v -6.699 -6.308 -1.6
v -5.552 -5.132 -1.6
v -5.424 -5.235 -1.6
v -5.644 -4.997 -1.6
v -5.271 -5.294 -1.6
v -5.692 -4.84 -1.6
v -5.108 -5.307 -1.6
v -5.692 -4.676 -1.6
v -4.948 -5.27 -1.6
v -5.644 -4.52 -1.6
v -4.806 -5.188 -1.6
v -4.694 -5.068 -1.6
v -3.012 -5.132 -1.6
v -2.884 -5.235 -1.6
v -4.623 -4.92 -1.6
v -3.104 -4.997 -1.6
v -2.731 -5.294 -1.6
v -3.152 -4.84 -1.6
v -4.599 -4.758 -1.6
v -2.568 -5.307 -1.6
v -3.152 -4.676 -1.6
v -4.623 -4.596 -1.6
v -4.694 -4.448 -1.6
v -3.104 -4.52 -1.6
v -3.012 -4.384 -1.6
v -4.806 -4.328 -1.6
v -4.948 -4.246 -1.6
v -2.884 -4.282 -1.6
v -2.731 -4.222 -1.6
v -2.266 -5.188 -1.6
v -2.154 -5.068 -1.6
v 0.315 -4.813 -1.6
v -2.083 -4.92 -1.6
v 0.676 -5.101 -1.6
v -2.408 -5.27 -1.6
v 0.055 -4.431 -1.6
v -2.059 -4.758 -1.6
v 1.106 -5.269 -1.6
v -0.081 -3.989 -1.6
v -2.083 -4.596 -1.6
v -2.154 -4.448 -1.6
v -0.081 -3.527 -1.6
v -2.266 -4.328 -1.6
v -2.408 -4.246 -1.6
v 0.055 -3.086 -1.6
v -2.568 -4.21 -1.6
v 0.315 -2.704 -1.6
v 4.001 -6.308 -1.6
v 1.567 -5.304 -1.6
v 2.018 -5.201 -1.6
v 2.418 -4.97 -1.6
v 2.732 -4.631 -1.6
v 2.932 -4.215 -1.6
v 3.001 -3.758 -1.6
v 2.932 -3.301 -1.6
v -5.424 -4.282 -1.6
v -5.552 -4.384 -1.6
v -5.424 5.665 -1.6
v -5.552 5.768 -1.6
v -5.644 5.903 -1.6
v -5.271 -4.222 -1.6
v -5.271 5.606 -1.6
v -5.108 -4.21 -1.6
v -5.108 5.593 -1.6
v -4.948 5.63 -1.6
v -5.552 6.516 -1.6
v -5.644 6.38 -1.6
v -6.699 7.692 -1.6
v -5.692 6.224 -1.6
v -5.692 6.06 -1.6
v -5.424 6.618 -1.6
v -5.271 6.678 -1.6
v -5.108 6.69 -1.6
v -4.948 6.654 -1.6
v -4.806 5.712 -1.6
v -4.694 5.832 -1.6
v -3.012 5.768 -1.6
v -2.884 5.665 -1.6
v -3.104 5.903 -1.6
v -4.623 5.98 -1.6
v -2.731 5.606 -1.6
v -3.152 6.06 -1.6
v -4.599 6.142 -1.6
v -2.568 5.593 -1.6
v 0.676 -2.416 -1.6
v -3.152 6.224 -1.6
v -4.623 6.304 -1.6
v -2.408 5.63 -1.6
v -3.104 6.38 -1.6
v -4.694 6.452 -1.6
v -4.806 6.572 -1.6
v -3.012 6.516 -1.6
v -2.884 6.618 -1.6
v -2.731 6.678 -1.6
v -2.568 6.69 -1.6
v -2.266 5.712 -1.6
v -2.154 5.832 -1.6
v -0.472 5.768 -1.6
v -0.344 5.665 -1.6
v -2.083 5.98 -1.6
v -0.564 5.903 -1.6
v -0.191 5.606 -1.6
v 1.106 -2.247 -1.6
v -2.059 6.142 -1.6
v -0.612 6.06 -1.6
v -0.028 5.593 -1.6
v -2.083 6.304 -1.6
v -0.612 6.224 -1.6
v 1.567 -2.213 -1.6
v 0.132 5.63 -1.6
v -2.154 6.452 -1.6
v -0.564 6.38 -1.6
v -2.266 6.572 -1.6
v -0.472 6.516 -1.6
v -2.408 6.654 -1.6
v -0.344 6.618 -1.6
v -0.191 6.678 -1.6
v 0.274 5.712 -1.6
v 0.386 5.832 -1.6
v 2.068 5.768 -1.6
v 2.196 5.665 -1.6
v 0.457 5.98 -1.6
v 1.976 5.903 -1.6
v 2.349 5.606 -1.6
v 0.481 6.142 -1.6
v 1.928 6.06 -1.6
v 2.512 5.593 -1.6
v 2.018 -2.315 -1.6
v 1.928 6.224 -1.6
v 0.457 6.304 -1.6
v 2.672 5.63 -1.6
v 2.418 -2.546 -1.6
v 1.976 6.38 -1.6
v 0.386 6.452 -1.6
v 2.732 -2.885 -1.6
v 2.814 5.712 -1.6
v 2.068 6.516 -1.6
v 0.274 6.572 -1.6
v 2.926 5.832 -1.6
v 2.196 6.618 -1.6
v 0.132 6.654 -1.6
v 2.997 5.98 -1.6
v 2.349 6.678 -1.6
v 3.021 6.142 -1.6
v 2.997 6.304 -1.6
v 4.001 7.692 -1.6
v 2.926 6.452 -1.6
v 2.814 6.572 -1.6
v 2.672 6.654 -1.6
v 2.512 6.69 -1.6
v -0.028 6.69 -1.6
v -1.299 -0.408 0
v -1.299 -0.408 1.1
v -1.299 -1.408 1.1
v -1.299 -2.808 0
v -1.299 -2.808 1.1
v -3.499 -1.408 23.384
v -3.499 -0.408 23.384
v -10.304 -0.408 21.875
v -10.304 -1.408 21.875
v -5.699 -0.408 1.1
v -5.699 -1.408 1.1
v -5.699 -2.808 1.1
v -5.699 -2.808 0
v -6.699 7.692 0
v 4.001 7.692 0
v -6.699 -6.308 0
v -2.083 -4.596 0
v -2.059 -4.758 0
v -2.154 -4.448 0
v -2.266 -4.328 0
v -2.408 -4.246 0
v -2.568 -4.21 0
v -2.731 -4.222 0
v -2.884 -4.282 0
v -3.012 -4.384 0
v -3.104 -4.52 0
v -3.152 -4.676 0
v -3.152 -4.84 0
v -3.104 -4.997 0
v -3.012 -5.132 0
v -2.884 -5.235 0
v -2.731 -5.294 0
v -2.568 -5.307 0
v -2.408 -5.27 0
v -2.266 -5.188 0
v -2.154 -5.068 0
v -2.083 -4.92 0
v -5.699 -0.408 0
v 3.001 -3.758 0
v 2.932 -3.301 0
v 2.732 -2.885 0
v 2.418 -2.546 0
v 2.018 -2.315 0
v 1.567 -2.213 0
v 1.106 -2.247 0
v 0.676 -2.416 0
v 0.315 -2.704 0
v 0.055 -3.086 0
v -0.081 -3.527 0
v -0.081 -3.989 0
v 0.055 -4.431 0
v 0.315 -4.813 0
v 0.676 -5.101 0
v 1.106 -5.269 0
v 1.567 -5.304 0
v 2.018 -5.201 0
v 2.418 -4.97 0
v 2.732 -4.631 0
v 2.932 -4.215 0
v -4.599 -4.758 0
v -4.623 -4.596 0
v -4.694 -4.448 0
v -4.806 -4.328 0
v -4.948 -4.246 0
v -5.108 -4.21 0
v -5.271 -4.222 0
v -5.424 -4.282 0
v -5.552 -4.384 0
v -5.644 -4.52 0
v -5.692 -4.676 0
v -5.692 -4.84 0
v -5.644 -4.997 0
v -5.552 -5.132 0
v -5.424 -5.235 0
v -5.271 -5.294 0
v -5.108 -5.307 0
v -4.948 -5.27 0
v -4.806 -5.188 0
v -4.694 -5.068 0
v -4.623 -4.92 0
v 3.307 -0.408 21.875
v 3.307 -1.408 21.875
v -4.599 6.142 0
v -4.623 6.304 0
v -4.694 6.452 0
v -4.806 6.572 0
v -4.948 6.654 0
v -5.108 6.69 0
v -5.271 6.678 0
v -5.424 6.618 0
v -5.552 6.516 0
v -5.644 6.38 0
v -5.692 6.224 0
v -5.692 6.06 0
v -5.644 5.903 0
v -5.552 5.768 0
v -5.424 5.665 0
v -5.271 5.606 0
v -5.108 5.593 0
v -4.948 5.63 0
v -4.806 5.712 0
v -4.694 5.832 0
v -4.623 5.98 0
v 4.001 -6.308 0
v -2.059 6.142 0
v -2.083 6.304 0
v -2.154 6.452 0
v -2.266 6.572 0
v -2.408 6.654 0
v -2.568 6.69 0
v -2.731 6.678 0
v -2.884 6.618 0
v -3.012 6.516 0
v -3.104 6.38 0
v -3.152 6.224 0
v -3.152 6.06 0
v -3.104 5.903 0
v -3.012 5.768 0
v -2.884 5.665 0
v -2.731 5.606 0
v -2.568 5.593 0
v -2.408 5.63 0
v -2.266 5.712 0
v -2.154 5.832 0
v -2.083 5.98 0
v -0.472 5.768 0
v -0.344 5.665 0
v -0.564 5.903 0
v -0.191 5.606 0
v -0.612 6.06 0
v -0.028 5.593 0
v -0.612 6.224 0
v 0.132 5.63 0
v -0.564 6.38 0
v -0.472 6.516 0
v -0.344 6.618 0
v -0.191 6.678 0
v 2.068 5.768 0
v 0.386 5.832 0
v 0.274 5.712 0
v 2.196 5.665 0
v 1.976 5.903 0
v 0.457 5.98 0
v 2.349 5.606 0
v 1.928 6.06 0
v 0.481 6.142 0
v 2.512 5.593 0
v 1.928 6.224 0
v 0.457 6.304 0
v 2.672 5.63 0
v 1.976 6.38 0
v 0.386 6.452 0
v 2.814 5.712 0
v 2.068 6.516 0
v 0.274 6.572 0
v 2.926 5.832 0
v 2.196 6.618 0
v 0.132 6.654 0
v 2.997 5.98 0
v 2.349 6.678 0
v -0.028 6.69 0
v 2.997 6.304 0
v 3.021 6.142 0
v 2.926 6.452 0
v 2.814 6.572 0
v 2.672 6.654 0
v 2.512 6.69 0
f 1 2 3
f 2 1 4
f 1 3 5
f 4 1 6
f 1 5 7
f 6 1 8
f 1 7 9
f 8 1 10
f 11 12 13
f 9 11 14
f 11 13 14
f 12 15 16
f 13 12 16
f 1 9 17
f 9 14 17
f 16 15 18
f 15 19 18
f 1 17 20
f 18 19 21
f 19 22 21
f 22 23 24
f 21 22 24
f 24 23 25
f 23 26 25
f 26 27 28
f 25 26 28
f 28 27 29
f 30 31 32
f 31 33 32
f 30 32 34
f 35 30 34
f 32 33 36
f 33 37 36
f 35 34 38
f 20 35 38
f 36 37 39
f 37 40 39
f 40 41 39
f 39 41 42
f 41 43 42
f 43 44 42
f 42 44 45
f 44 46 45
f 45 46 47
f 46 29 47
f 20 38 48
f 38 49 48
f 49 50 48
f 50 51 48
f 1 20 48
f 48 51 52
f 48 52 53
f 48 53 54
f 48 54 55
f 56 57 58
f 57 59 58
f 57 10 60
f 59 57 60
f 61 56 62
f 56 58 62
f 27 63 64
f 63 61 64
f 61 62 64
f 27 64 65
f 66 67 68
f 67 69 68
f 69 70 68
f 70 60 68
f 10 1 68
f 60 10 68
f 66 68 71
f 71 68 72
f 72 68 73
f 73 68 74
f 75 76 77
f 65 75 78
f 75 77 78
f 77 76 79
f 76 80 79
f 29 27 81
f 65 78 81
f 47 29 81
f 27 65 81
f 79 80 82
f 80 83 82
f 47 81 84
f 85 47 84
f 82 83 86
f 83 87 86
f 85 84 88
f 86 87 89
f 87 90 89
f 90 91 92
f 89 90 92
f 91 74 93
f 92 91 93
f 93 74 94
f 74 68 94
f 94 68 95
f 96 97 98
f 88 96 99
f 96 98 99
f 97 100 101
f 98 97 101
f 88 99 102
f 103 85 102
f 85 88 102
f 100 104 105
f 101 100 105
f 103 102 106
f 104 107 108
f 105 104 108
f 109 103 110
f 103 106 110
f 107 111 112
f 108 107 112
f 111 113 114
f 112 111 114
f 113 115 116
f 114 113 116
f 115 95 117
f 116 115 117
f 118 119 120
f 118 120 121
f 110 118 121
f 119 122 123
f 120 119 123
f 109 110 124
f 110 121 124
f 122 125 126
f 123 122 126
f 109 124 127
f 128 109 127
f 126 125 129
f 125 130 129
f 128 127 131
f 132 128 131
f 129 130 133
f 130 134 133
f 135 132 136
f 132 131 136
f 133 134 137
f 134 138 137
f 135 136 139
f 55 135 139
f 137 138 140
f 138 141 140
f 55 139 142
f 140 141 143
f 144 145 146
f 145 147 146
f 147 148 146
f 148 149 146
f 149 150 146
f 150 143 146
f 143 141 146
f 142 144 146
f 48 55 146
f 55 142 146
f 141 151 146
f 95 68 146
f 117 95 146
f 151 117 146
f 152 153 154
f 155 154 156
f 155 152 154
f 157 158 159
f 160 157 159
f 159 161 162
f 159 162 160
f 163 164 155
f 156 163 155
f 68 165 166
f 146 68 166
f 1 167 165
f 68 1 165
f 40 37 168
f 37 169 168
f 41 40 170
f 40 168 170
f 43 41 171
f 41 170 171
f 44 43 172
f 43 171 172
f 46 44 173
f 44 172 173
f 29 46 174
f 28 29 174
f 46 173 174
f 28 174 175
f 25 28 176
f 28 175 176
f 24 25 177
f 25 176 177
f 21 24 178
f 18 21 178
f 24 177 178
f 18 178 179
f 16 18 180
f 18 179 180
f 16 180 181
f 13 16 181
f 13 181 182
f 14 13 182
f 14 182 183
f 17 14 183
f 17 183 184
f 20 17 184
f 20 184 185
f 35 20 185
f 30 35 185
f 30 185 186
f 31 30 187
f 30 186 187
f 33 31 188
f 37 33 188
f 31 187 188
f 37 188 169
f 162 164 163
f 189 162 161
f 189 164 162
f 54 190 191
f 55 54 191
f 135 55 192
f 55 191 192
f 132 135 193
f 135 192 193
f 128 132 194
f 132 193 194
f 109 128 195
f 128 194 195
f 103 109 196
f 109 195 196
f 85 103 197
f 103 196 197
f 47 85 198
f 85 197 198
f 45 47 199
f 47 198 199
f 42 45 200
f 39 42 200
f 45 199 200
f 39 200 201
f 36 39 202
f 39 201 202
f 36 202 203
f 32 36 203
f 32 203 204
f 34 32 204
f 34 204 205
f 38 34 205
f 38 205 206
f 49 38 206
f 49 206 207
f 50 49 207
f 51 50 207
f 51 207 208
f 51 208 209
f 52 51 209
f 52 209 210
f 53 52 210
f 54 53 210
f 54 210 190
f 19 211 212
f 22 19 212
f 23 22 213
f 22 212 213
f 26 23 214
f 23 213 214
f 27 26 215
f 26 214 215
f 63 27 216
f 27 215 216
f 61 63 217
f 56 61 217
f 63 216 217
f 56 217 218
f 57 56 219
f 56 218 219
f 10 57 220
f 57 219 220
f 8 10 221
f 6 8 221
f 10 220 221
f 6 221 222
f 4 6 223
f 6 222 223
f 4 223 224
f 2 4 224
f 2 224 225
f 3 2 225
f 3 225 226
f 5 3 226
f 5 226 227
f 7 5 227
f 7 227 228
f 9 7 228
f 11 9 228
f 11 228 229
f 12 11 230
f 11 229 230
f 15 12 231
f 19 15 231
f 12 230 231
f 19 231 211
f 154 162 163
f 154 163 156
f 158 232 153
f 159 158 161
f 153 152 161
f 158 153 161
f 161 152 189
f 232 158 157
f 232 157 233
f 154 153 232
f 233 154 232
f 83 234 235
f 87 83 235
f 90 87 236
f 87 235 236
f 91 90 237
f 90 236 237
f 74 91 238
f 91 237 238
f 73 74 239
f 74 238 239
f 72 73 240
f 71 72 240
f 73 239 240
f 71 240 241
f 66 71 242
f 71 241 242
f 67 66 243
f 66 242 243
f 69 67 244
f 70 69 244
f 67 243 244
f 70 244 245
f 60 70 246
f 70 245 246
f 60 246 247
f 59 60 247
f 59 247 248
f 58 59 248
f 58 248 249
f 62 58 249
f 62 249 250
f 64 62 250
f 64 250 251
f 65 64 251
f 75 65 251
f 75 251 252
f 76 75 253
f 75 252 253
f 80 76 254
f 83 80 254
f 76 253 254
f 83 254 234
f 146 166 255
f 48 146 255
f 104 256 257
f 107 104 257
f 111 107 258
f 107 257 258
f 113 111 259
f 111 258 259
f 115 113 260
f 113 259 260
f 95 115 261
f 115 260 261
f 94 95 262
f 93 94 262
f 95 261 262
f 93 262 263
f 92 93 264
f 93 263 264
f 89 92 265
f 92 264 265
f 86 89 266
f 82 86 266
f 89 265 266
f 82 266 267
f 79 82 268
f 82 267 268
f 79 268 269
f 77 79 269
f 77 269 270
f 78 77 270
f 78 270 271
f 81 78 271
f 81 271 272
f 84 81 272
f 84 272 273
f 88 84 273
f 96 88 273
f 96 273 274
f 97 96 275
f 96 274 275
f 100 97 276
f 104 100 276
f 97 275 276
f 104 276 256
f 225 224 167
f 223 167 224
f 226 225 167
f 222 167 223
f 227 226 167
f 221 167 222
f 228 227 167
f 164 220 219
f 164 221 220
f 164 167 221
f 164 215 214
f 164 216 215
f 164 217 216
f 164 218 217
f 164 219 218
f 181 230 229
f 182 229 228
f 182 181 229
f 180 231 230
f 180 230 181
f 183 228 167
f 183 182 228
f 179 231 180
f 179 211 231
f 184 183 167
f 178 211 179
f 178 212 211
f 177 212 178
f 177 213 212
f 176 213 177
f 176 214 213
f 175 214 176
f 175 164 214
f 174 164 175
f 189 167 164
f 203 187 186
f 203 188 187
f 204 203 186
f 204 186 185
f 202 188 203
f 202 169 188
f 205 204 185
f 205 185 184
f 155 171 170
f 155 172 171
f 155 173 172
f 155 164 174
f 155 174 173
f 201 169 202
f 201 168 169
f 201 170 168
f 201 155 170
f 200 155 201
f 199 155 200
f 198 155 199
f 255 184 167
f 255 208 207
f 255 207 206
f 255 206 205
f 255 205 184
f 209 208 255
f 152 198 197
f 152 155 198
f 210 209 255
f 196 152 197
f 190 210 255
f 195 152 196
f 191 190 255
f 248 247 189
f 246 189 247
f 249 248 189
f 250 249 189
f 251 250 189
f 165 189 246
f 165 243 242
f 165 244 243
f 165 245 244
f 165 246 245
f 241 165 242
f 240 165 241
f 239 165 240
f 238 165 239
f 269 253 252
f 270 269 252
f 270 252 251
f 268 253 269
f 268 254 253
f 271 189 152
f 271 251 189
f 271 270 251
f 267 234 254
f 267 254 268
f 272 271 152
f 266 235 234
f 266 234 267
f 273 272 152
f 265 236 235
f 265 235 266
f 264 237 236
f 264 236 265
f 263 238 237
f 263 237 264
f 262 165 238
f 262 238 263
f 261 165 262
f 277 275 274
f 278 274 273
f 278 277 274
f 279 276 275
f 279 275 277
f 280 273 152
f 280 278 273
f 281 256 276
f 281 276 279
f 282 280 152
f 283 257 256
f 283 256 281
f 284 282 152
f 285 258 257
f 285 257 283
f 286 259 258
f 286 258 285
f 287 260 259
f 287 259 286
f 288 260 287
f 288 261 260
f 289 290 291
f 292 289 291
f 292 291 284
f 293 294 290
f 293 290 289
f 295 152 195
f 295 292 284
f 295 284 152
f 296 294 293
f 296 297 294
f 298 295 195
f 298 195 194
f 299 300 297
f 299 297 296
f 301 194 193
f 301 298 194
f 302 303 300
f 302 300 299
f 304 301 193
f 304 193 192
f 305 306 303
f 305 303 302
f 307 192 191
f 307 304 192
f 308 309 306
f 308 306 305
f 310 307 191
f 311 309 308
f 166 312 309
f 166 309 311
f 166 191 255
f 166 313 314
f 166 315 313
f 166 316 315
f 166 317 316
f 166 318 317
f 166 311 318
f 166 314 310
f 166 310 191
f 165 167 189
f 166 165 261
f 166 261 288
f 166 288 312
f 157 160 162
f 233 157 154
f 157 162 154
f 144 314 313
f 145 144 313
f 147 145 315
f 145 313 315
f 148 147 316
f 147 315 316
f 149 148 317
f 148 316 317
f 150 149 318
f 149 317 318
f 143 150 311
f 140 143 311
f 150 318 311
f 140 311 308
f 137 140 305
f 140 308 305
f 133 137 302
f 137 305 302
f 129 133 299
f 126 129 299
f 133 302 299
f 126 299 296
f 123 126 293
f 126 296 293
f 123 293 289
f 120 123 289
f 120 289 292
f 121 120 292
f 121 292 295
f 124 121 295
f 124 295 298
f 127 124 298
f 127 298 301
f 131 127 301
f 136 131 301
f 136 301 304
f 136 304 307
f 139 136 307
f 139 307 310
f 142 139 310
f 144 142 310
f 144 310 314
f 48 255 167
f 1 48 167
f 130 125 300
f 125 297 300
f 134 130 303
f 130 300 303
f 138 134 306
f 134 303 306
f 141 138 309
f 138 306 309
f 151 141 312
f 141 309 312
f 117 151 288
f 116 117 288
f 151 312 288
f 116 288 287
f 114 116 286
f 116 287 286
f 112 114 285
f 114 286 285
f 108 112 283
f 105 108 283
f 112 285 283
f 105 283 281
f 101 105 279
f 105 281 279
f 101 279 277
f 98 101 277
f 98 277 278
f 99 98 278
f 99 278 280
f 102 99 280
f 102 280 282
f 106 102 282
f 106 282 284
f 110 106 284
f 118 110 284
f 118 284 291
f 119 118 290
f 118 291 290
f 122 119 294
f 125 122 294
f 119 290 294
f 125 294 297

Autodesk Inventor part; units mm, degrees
ref_plane "YZ Plane" through (0, 0, 0) normal (1, 0, 0) x (0, 1, 0)
ref_plane "XZ Plane" through (0, 0, 0) normal (0, 1, 0) x (-1, 0, 0)
ref_plane "XY Plane" through (0, 0, 0) normal (0, 0, 1) x (1, 0, 0)
sketch "Sketch1" plane through (0, 0, 0) normal (0, 0, 1) x (1, 0, 0)
  line L0 (-6.698639, 7.691729) -> (4.001361, 7.691729)
  line L1 (4.001361, 7.691729) -> (4.001361, -6.308271)
  line L2 (4.001361, -6.308271) -> (-6.698639, -6.308271)
  line L3 (-6.698639, -6.308271) -> (-6.698639, 7.691729)
  line L4 (4.001361, -6.308271) -> (-6.698639, -6.308271)
  line L5 (-6.698639, -6.308271) -> (-6.698639, -2.808271)
  line L6 (-6.698639, -2.808271) -> (4.001361, -2.808271)
  line L7 (4.001361, -2.808271) -> (4.001361, -6.308271)
  line L8 (-6.698639, -6.308271) -> (-5.698639, -6.308271)
  line L9 (-5.698639, -6.308271) -> (-5.698639, 7.691729)
  line L10 (-5.698639, 7.691729) -> (-6.698639, 7.691729)
  line L11 (-6.698639, 7.691729) -> (-6.698639, -6.308271)
  line L12 (-5.698639, -2.808271) -> (3.472299, -2.808271)
  line L13 (3.472299, -2.808271) -> (3.472299, -0.408271)
  line L14 (3.472299, -0.408271) -> (-5.698639, -0.408271)
  line L15 (-5.698639, -0.408271) -> (-5.698639, -2.808271)
  line L16 (-5.698639, -0.408271) -> (-1.298639, -0.408271)
  line L17 (-1.298639, -0.408271) -> (-1.298639, -2.808271)
  line L18 (-1.298639, -2.808271) -> (-5.698639, -2.808271)
  line L19 (-5.698639, -2.808271) -> (-5.698639, -0.408271)
  point P0 (0, 0)
  dimension "d0" = 10.7
  dimension "d1" = 14
  dimension "d2" = 3.5
  dimension "d3" = 1
  dimension "d4" = 2.4
  dimension "d5" = 4.4
extrude "Extrusion1" add sketch "Sketch1" against normal blind 1.6
extrude "Extrusion2" add sketch "Sketch1" along normal blind 1.1 contours L14 L17 L6 L9
sketch "Sketch2" plane through (0, 0, 0) normal (0, 0, 1) x (1, 0, 0)
  line L0 (-1.298639, -0.408271) -> (-1.298639, -2.808271)
  line L1 (-1.298639, -2.808271) -> (-5.698639, -2.808271)
  line L2 (-5.698639, -2.808271) -> (-5.698639, -0.408271)
  line L3 (-5.698639, -0.408271) -> (-1.298639, -0.408271)
  line L4 (4.001361, 7.691729) -> (-6.698639, 7.691729)
  line L5 (-6.698639, 7.691729) -> (-6.698639, -6.308271)
  line L6 (-6.698639, -6.308271) -> (4.001361, -6.308271)
  line L7 (4.001361, -6.308271) -> (4.001361, 7.691729)
  line L8 (4.001361, -6.308271) -> (4.001361, 7.691729)
  line L9 (-6.698639, 7.691729) -> (-6.698639, -6.308271)
  line L10 (4.001361, -6.308271) -> (-6.698639, -6.308271)
  line L11 (-6.698639, -6.308271) -> (-6.698639, -5.308271)
  line L12 (-6.698639, -5.308271) -> (4.001361, -5.308271)
  line L13 (4.001361, -5.308271) -> (4.001361, -6.308271)
  line L14 (4.001361, -6.308271) -> (3.001361, -6.308271)
  line L15 (3.001361, -6.308271) -> (3.001361, -2.808271)
  line L16 (3.001361, -2.808271) -> (4.001361, -2.808271)
  line L17 (4.001361, -2.808271) -> (4.001361, -6.308271)
  line L18 (-6.698639, -6.308271) -> (-0.098639, -6.308271)
  line L19 (-0.098639, -6.308271) -> (-0.098639, -2.808271)
  line L20 (-0.098639, -2.808271) -> (-6.698639, -2.808271)
  line L21 (-6.698639, -2.808271) -> (-6.698639, -6.308271)
  circle A0 centre (1.451361, -3.758271) radius 1.55
  point P0 (0, 0)
  dimension "d10" = 1
  dimension "d11" = 1
  dimension "d12" = 6.6
extrude "Extrusion3" cut sketch "Sketch2" against normal through all contours A0
sketch "Sketch3" plane through (0, 0, 0) normal (0, 0, 1) x (1, 0, 0)
  line L0 (4.001361, 7.691729) -> (4.001361, -6.308271)
  line L1 (-6.698639, 7.691729) -> (4.001361, 7.691729)
  line L2 (4.001361, 7.691729) -> (4.001361, 6.691729)
  line L3 (4.001361, 6.691729) -> (-6.698639, 6.691729)
  line L4 (-6.698639, 6.691729) -> (-6.698639, 7.691729)
  line L5 (-6.698639, 7.691729) -> (-5.698639, 7.691729)
  line L6 (-5.698639, 7.691729) -> (-5.698639, 5.612457)
  line L7 (-5.698639, 5.612457) -> (-6.698639, 5.612457)
  line L8 (-6.698639, 5.612457) -> (-6.698639, 7.691729)
  line L9 (-5.698639, 6.691729) -> (-4.598639, 6.691729)
  line L10 (-4.598639, 6.691729) -> (-4.598639, 6.161753)
  line L11 (-4.598639, 6.161753) -> (-5.698639, 6.161753)
  line L12 (-5.698639, 6.161753) -> (-5.698639, 6.691729)
  circle A0 centre (-5.148639, 6.141729) radius 0.55
  circle A1 centre (-2.608639, 6.141729) radius 0.55
  line L13 (-2.058639, 6.161753) -> (-3.158639, 6.161753)
  circle A2 centre (-0.068639, 6.141729) radius 0.55
  line L14 (0.481361, 6.161753) -> (-0.618639, 6.161753)
  circle A3 centre (2.471361, 6.141729) radius 0.55
  line L15 (3.021361, 6.161753) -> (1.921361, 6.161753)
  circle A4 centre (1.451361, -3.758271) radius 1.55
  line L16 (-1.298639, -0.408271) -> (-1.298639, -2.808271)
  line L17 (-1.298639, -2.808271) -> (-5.698639, -2.808271)
  line L18 (-5.698639, -2.808271) -> (-5.698639, -0.408271)
  line L19 (-5.698639, -0.408271) -> (-1.298639, -0.408271)
  line L20 (4.001361, 7.691729) -> (-6.698639, 7.691729)
  line L21 (-6.698639, 7.691729) -> (-6.698639, -6.308271)
  line L22 (-6.698639, -6.308271) -> (4.001361, -6.308271)
  line L23 (4.001361, -6.308271) -> (4.001361, 7.691729)
  line L24 (-6.698639, -6.308271) -> (-5.698639, -6.308271)
  line L25 (-5.698639, -6.308271) -> (-5.698639, -3.371834)
  line L26 (-5.698639, -3.371834) -> (-6.698639, -3.371834)
  line L27 (-6.698639, -3.371834) -> (-6.698639, -6.308271)
  line L28 (-6.698639, -6.308271) -> (4.001361, -6.308271)
  line L29 (-6.698639, -6.308271) -> (-3.498639, -6.308271)
  line L30 (-3.498639, -6.308271) -> (-3.498639, -5.308271)
  line L31 (-3.498639, -5.308271) -> (-6.698639, -5.308271)
  line L32 (-6.698639, -5.308271) -> (-6.698639, -6.308271)
  line L33 (-5.698639, -6.308271) -> (-4.598639, -6.308271)
  line L34 (-4.598639, -6.308271) -> (-4.598639, -3.371834)
  line L35 (-4.598639, -3.371834) -> (-5.698639, -3.371834)
  line L36 (-5.698639, -3.371834) -> (-5.698639, -6.308271)
  circle A5 centre (-5.148639, -4.758271) radius 0.55
  circle A6 centre (-2.608639, -4.758271) radius 0.55
  line L37 (-0.958639, -5.308271) -> (-4.158639, -5.308271)
  point P0 (0, 0)
  dimension "d15" = 1
  dimension "d16" = 1
  dimension "d17" = 1.1
  dimension "d20" = 2.54
  dimension "d25" = 1
  dimension "d26" = 1
  dimension "d27" = 1.1
  dimension "d30" = 2.54
sketch "Sketch3 outline for Extrusion4" plane through (0, 0, 0) normal (0, 0, 1) x (1, 0, 0)
  circle A0 centre (-5.148639, -4.758271) radius 0.55
  circle A1 centre (-2.608639, -4.758271) radius 0.55
  circle A2 centre (2.471361, 6.141729) radius 0.55
  circle A3 centre (-0.068639, 6.141729) radius 0.55
  circle A4 centre (-2.608639, 6.141729) radius 0.55
  circle A5 centre (-5.148639, 6.141729) radius 0.55
extrude "Extrusion4" cut sketch "Sketch3 outline for Extrusion4" against normal through all
sketch "Sketch4" plane through (-5.698639, -0.408271, 0) normal (0, 1, 0) x (1, 0, 0)
  line L0 (0, 0) -> (4.4, 0)
  line L1 (0, 0) -> (0, -1.1)
  line L2 (4.4, -1.1) -> (0, -1.1)
  line L3 (4.4, 0) -> (4.4, -1.1)
  line L4 (0, -1.1) -> (-17.024616, -77.893079)
  line L5 (4.4, -1.1) -> (11.53177, -33.269335)
  line L6 (2.2, -1.1) -> (2.2, -23.383849)
  line L7 (4.4, -1.1) -> (0, -1.1)
  line L8 (11.53177, -33.269335) -> (26.881941, -102.509481)
  circle A0 centre (2.2, -1.1) radius 22.283849
  line L9 (2.2, -23.383849) -> (9.005719, -21.875057)
  line L10 (2.2, -23.383849) -> (-4.605719, -21.875057)
  point P0 (5.698639, 0)
  dimension "d37" = 12.5
  dimension "d38" = 12.5
extrude "Wyciągnięcie proste5" add sketch "Sketch4" against normal blind 1 contours L2 L6 L10 L4 | L5 L9 L6 L2
sketch "Szkic5" plane through (-5.698639, -0.408271, 0) normal (0, 1, 0) x (1, 0, 0)
  line L0 (0, 0) -> (4.4, 0)
  line L1 (0, 0) -> (0, -1.1)
  line L2 (0, -1.1) -> (-4.605719, -21.875057)
  line L3 (-4.605719, -21.875057) -> (2.2, -23.383849)
  line L4 (2.2, -23.383849) -> (9.005719, -21.875057)
  line L5 (9.005719, -21.875057) -> (4.4, -1.1)
  line L6 (4.4, 0) -> (4.4, -1.1)
  line L7 (0, -1.1) -> (4.4, -1.1)
  line L8 (4.4, -1.1) -> (26.847507, -102.354162)
  line L9 (2.2, -1.1) -> (2.2, -251.1)
  line L10 (26.847507, -102.354162) -> (58.457755, -244.938774)
  line L11 (0, -1.1) -> (-54.057755, -244.938774)
  line L12 (2.2, -1.1) -> (2.2, 19.845326)
  line L13 (0, -1.1) -> (4.4, 18.747117)
  arc A0 (-54.057755, -244.938774) -> (58.457755, -244.938774) centre (2.2, 8.823559) ccw
  line L14 (2.2, -251.1) -> (0, -251.1)
  point P0 (5.698639, 0)
  dimension "d41" = 250
sketch "Szkic6" plane through (-5.698639, -0.408271, 0) normal (0, 1, 0) x (1, 0, 0)
  line L0 (2.2, -23.383849) -> (-4.605719, -21.875057)
  line L1 (-4.605719, -21.875057) -> (2.53543, 10.336584)
  line L2 (9.005719, -21.875057) -> (2.2, -23.383849)
  line L3 (9.005719, -21.875057) -> (2.2, 8.823559)
  line L4 (2.2, 8.823559) -> (2.2, -23.383849)
  line L5 (2.2, 8.823559) -> (-2.082149, -26.051744)
  line L6 (2.2, 8.823559) -> (6.293179, -24.512711)
  point P0 (5.698639, 0)
  dimension "d42" = 7
  dimension "d43" = 7
properties part number "TOF_VLCOS"
